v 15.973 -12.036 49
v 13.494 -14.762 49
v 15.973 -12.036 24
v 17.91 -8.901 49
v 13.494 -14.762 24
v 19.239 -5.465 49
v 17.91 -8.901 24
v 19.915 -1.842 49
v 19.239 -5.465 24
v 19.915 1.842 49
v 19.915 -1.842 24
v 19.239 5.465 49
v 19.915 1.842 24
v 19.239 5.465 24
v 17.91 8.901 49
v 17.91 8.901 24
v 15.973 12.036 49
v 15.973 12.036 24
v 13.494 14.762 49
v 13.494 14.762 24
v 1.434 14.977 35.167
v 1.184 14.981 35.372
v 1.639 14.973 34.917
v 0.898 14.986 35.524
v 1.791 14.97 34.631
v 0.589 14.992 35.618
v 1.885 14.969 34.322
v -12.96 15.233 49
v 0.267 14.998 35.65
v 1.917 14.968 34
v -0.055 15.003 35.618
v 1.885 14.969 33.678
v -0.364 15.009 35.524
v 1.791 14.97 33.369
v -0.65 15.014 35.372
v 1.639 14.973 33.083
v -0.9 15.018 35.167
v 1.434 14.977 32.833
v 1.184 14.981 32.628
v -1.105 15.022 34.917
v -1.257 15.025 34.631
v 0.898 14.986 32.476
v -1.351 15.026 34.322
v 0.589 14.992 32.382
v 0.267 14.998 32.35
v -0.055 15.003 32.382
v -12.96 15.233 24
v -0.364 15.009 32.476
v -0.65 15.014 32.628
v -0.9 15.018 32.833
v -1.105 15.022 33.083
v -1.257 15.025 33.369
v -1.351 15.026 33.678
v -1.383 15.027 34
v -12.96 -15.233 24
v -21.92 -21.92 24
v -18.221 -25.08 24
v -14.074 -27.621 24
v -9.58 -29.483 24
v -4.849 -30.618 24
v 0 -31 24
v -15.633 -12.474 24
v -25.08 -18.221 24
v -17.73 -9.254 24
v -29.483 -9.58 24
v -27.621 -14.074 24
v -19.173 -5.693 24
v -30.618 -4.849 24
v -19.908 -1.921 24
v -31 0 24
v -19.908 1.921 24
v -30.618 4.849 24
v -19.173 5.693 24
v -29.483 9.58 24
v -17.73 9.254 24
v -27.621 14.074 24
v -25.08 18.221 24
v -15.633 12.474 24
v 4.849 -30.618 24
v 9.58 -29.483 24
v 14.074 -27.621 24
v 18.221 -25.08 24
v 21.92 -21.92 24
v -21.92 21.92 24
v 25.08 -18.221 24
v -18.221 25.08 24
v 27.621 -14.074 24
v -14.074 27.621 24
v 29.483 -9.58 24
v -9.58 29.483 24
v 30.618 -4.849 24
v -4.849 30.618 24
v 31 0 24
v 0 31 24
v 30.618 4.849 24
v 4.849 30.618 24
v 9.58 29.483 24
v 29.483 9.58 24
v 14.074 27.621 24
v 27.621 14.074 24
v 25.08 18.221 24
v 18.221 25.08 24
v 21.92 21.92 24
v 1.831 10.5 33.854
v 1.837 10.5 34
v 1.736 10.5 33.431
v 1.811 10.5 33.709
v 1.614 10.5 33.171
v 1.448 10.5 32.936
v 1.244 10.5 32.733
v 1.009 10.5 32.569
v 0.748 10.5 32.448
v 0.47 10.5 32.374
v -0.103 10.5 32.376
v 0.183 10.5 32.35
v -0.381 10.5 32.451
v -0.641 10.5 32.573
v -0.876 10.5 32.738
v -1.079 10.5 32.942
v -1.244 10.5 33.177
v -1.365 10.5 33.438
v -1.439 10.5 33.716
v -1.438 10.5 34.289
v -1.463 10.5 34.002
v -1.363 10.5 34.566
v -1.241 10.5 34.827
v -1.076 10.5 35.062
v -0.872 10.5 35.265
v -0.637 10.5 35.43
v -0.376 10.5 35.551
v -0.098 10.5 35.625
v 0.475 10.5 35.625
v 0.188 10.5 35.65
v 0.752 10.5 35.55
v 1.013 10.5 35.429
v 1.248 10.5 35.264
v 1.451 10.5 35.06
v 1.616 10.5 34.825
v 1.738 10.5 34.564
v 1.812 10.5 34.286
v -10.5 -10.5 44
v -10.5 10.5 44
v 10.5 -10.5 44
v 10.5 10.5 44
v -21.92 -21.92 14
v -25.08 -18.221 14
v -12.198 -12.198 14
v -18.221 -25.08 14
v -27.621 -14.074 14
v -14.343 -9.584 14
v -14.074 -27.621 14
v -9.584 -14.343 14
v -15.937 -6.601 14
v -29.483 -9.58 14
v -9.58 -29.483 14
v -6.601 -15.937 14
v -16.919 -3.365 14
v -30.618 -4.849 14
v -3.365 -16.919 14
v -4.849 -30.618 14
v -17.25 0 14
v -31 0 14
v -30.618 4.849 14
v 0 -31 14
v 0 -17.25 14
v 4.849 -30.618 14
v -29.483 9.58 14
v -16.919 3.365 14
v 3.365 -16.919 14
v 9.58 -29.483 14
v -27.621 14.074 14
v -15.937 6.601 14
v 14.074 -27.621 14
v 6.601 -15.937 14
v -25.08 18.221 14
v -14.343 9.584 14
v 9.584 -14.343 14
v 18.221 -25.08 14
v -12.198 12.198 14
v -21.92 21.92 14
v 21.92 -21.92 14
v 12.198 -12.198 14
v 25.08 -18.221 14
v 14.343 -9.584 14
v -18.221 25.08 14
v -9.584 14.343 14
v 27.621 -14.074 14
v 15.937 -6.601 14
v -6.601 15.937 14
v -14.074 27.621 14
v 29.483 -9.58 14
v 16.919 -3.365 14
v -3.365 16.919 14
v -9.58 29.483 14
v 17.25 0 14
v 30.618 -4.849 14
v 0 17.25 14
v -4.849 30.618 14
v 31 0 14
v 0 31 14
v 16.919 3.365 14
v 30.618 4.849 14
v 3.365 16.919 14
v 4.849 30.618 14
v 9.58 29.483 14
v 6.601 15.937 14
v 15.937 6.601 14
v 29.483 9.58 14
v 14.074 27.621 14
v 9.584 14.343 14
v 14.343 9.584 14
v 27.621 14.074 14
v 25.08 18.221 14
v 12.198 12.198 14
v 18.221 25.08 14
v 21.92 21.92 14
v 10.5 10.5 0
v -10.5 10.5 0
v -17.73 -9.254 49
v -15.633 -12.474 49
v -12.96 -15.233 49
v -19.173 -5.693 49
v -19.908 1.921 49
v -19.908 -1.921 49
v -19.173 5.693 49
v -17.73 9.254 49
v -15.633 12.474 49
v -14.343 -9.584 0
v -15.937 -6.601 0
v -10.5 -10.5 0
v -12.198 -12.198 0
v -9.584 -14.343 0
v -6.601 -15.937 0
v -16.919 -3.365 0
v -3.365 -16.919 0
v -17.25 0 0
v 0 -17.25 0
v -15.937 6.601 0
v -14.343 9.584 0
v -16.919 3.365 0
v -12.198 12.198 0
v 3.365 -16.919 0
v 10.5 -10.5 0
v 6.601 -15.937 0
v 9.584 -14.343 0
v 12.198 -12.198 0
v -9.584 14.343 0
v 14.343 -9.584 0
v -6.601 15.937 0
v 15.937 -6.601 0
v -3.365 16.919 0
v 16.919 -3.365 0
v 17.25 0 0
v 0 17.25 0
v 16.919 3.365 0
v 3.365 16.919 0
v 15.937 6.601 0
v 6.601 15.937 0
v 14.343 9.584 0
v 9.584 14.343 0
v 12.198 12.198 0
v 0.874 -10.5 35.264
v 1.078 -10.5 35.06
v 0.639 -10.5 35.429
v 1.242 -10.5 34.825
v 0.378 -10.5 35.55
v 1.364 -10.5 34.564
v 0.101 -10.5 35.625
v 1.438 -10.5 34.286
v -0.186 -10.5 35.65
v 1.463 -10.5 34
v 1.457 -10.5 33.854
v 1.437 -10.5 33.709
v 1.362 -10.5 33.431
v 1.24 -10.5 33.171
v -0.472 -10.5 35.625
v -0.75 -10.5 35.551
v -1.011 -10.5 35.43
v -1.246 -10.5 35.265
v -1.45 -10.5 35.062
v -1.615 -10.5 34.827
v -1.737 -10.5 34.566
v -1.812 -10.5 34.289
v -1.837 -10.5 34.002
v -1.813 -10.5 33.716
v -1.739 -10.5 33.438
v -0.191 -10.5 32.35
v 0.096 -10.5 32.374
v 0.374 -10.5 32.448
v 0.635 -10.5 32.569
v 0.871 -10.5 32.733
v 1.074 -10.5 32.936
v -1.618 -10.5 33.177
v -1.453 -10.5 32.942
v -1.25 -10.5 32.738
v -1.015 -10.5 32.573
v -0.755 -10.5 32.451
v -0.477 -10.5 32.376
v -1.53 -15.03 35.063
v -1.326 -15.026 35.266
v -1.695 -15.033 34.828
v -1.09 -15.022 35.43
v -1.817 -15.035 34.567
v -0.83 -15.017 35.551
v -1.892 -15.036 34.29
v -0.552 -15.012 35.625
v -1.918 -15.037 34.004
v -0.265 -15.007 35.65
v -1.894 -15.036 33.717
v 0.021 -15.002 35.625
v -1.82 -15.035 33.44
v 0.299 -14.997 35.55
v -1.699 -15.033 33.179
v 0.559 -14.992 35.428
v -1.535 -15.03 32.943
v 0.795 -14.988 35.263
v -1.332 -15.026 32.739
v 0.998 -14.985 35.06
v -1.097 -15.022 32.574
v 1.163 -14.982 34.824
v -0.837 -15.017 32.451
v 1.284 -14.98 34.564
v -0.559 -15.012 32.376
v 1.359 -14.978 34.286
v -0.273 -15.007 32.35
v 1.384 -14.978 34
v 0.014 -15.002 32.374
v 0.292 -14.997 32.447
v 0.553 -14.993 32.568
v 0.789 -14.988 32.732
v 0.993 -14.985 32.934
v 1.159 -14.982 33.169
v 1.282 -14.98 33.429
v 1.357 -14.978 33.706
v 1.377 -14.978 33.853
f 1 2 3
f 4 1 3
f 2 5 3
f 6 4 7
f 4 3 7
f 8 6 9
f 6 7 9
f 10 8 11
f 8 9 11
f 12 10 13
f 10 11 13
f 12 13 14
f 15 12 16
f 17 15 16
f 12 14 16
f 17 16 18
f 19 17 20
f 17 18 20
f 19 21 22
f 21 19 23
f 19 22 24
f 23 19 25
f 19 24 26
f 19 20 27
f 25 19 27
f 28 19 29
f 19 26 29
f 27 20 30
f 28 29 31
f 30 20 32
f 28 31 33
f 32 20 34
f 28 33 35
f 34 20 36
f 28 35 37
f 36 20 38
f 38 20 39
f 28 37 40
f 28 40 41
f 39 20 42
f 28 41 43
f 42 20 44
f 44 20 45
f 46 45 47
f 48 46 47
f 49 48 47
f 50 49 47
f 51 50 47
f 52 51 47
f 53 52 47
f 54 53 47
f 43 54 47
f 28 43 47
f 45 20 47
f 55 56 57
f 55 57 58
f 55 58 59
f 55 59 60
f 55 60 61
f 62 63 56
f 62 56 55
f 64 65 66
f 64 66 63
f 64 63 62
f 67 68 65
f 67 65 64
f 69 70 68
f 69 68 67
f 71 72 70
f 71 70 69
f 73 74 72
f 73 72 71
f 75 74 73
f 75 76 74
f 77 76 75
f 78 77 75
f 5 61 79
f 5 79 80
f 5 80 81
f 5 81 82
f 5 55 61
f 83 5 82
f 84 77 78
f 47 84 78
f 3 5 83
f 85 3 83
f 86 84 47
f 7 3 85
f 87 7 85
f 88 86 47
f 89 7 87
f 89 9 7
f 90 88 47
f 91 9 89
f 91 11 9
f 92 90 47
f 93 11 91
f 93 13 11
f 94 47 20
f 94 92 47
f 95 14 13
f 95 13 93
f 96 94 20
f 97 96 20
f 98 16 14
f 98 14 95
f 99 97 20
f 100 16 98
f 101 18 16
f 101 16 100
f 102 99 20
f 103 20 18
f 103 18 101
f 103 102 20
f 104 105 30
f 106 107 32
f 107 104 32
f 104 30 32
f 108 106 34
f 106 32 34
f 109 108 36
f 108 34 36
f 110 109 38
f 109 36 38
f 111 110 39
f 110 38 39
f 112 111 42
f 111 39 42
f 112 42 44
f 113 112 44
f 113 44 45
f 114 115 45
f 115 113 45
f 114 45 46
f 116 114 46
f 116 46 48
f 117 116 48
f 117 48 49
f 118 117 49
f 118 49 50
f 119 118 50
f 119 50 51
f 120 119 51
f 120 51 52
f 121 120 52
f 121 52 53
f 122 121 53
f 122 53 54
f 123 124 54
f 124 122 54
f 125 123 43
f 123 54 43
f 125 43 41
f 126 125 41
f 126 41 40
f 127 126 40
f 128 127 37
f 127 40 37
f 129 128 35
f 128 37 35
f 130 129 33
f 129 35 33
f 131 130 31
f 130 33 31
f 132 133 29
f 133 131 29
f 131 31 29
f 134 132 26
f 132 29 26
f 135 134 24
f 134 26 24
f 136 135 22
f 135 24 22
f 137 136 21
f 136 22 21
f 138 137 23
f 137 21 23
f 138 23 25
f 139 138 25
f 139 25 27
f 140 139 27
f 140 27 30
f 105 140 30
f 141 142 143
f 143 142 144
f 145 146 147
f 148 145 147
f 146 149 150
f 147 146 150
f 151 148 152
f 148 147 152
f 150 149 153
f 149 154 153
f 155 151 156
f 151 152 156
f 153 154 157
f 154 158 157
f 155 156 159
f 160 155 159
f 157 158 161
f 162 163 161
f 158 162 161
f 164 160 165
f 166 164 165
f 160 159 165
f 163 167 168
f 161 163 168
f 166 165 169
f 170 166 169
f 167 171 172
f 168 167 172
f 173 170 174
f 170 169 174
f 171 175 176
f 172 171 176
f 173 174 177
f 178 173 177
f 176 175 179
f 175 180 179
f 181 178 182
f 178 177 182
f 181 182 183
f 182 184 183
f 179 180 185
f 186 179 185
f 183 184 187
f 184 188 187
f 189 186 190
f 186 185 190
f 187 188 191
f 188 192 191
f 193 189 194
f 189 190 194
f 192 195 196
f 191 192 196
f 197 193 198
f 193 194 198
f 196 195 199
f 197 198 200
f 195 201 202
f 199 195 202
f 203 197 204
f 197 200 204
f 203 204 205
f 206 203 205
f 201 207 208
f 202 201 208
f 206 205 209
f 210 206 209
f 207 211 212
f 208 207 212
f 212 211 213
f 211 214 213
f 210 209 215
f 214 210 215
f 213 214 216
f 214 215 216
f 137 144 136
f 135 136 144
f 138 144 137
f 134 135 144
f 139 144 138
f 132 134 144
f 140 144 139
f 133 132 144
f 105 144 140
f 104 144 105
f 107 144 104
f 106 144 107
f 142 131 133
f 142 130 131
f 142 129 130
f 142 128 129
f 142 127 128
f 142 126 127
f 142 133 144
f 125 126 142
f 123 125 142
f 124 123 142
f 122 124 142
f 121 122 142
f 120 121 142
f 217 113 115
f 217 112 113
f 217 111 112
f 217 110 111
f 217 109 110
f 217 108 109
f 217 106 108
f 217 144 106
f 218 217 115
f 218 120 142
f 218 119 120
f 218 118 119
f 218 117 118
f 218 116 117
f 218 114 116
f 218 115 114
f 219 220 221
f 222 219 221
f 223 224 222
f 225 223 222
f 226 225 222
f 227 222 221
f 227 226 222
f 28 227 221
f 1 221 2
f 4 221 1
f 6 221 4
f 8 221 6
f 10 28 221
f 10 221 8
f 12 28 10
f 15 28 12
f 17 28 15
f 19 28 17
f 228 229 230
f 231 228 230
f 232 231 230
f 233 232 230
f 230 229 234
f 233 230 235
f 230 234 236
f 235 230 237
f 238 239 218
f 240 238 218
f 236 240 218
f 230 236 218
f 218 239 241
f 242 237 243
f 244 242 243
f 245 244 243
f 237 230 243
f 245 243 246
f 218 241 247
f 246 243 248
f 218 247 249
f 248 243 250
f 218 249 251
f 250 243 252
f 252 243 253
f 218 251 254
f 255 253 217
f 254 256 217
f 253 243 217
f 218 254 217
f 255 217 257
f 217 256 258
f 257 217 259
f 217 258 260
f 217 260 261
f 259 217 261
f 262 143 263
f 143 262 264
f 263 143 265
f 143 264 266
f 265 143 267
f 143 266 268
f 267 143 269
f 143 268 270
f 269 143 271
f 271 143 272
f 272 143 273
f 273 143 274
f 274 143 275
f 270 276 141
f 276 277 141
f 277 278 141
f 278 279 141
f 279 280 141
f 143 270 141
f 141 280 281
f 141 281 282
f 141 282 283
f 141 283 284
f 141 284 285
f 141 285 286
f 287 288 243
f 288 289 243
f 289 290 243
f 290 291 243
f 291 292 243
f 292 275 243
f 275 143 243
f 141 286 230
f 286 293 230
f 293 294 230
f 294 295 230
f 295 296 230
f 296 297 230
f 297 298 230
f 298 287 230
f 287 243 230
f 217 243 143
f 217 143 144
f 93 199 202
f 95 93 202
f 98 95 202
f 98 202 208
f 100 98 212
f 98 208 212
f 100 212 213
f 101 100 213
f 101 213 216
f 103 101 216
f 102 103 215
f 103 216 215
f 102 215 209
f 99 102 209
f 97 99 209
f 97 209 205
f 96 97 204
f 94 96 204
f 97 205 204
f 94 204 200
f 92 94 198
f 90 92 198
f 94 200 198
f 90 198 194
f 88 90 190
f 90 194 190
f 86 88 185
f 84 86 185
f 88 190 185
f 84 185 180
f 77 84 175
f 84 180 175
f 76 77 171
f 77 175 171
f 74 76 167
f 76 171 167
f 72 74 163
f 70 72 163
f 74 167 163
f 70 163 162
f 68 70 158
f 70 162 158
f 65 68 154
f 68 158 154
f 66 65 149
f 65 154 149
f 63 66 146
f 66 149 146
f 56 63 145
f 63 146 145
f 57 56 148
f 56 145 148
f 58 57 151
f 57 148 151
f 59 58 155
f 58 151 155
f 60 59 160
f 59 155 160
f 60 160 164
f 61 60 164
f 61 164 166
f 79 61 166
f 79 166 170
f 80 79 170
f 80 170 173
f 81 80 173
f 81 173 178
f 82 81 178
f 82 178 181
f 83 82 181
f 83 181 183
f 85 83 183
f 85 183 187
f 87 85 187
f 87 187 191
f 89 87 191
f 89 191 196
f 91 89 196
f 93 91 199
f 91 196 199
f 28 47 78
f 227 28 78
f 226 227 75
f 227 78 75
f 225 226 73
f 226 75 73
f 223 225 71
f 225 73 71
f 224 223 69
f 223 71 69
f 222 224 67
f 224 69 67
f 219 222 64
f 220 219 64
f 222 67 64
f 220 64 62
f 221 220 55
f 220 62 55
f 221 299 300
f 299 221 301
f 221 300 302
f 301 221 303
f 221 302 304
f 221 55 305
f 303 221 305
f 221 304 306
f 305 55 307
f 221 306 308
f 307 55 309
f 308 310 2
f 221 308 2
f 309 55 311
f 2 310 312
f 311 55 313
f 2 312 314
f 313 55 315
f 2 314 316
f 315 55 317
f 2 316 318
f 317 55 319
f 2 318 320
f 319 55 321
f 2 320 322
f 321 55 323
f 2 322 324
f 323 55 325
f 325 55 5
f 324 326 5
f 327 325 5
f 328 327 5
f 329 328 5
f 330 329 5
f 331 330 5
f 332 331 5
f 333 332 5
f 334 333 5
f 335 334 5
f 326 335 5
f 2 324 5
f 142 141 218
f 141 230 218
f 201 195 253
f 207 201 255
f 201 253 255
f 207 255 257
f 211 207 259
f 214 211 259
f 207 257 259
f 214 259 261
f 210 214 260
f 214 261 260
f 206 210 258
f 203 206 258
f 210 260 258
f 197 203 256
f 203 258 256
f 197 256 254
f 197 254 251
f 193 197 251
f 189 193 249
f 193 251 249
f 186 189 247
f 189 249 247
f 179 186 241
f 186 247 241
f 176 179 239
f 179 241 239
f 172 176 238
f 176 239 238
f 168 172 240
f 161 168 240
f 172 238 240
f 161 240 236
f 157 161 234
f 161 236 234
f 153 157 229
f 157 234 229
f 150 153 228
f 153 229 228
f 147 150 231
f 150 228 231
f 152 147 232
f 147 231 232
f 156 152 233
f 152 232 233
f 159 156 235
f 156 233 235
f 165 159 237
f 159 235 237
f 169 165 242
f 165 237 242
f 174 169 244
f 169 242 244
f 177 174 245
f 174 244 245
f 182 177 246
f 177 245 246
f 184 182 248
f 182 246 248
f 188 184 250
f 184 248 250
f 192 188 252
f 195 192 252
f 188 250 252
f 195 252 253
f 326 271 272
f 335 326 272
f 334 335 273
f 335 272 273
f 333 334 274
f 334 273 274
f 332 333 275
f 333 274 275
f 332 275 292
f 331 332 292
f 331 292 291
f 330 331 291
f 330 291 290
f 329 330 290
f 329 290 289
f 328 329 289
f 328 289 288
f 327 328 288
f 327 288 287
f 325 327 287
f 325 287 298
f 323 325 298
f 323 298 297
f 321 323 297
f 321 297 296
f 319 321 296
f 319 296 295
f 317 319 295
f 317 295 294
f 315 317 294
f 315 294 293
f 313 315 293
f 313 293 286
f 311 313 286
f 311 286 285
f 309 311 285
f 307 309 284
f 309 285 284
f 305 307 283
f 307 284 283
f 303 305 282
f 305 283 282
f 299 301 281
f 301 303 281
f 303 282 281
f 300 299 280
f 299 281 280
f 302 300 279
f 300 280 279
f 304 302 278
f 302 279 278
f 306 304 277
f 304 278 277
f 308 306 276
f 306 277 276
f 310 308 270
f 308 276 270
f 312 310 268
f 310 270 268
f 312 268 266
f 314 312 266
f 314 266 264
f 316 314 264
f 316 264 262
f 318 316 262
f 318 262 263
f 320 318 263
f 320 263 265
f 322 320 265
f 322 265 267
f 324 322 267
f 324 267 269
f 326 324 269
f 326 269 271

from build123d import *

# Parameters (mm, degrees)
SKETCH_1_R               = 17.25
EXTRUDE_1_DEPTH          = 14
SKETCH_2_R               = 31
EXTRUDE_2_DEPTH          = 10
CUT_EXTRUDE_1_DEPTH      = 50.979995998
CUT_EXTRUDE_1_DEPTH_BACK = 50.979995998
SKETCH_3_W               = 21
SKETCH_3_H               = 21
EXTRUDE_3_DEPTH          = 20
SKETCH_5_W               = 21
SKETCH_5_H               = 21
CUT_EXTRUDE_2_DEPTH      = 20
SKETCH_6_R               = 1.65
CUT_EXTRUDE_3_DEPTH      = 56
EXTRUDE_4_DEPTH          = 5


with BuildPart() as part:
    # 草图1 → 凸台-拉伸1 (new body)
    with BuildSketch(Plane.XY):
        Circle(SKETCH_1_R)
    extrude(amount=EXTRUDE_1_DEPTH)

    # 草图2 → 凸台-拉伸2 (add)
    with BuildSketch(Plane.XY.offset(14)):
        Circle(SKETCH_2_R)
    extrude(amount=EXTRUDE_2_DEPTH)

    # 草图3 → 切除-拉伸1 (cut, two sides: drawn at the far end of the back side and taken through both)
    with BuildSketch(Plane(origin=(0, 0, 0), x_dir=(-1, 0, 0), z_dir=(0, 0, -1)).offset(-CUT_EXTRUDE_1_DEPTH_BACK)):
        Rectangle(SKETCH_3_W, SKETCH_3_H)
    extrude(amount=CUT_EXTRUDE_1_DEPTH + CUT_EXTRUDE_1_DEPTH_BACK, mode=Mode.SUBTRACT)

    # 草图4 → 凸台-拉伸3 (add)
    with BuildSketch(Plane.XY.offset(24)):
        with BuildLine():
            Line((-12.959637187, 15.233115373), (13.493683466, 14.762130826))
            ThreePointArc((13.493683466, 14.762130826), (20, 0), (13.493683466, -14.762130826))
            Line((13.493683466, -14.762130826), (-12.959637187, -15.233115373))
            ThreePointArc((-12.959637187, -15.233115373), (-20, 0), (-12.959637187, 15.233115373))
        make_face()
    extrude(amount=EXTRUDE_3_DEPTH)

    # 草图5 → 切除-拉伸2 (cut)
    with BuildSketch(Plane(origin=(0, 0, 24), x_dir=(-1, 0, 0), z_dir=(0, 0, -1))):
        Rectangle(SKETCH_5_W, SKETCH_5_H)
    extrude(amount=-CUT_EXTRUDE_2_DEPTH, mode=Mode.SUBTRACT)

    # 草图6 → 切除-拉伸3 (cut)
    with BuildSketch(Plane(origin=(0.267023139, 14.9976231, 0), x_dir=(0.9998415399853875, -0.017801542619919335, 0), z_dir=(0.017801542619919338, 0.9998415399853876, 0))):
        with Locations((0, -34)):
            Circle(SKETCH_6_R)
    extrude(amount=-CUT_EXTRUDE_3_DEPTH, mode=Mode.SUBTRACT)

    # 草图8 → 凸台-拉伸4 (add)
    with BuildSketch(Plane.XY.offset(44)):
        with BuildLine():
            Line((-12.959637187, -15.233115373), (13.493683466, -14.762130826))
            ThreePointArc((13.493683466, -14.762130826), (20, 0), (13.493683466, 14.762130826))
            Line((13.493683466, 14.762130826), (-12.959637187, 15.233115373))
            ThreePointArc((-12.959637187, 15.233115373), (-20, 0), (-12.959637187, -15.233115373))
        make_face()
    extrude(amount=EXTRUDE_4_DEPTH)


solid = part.part
